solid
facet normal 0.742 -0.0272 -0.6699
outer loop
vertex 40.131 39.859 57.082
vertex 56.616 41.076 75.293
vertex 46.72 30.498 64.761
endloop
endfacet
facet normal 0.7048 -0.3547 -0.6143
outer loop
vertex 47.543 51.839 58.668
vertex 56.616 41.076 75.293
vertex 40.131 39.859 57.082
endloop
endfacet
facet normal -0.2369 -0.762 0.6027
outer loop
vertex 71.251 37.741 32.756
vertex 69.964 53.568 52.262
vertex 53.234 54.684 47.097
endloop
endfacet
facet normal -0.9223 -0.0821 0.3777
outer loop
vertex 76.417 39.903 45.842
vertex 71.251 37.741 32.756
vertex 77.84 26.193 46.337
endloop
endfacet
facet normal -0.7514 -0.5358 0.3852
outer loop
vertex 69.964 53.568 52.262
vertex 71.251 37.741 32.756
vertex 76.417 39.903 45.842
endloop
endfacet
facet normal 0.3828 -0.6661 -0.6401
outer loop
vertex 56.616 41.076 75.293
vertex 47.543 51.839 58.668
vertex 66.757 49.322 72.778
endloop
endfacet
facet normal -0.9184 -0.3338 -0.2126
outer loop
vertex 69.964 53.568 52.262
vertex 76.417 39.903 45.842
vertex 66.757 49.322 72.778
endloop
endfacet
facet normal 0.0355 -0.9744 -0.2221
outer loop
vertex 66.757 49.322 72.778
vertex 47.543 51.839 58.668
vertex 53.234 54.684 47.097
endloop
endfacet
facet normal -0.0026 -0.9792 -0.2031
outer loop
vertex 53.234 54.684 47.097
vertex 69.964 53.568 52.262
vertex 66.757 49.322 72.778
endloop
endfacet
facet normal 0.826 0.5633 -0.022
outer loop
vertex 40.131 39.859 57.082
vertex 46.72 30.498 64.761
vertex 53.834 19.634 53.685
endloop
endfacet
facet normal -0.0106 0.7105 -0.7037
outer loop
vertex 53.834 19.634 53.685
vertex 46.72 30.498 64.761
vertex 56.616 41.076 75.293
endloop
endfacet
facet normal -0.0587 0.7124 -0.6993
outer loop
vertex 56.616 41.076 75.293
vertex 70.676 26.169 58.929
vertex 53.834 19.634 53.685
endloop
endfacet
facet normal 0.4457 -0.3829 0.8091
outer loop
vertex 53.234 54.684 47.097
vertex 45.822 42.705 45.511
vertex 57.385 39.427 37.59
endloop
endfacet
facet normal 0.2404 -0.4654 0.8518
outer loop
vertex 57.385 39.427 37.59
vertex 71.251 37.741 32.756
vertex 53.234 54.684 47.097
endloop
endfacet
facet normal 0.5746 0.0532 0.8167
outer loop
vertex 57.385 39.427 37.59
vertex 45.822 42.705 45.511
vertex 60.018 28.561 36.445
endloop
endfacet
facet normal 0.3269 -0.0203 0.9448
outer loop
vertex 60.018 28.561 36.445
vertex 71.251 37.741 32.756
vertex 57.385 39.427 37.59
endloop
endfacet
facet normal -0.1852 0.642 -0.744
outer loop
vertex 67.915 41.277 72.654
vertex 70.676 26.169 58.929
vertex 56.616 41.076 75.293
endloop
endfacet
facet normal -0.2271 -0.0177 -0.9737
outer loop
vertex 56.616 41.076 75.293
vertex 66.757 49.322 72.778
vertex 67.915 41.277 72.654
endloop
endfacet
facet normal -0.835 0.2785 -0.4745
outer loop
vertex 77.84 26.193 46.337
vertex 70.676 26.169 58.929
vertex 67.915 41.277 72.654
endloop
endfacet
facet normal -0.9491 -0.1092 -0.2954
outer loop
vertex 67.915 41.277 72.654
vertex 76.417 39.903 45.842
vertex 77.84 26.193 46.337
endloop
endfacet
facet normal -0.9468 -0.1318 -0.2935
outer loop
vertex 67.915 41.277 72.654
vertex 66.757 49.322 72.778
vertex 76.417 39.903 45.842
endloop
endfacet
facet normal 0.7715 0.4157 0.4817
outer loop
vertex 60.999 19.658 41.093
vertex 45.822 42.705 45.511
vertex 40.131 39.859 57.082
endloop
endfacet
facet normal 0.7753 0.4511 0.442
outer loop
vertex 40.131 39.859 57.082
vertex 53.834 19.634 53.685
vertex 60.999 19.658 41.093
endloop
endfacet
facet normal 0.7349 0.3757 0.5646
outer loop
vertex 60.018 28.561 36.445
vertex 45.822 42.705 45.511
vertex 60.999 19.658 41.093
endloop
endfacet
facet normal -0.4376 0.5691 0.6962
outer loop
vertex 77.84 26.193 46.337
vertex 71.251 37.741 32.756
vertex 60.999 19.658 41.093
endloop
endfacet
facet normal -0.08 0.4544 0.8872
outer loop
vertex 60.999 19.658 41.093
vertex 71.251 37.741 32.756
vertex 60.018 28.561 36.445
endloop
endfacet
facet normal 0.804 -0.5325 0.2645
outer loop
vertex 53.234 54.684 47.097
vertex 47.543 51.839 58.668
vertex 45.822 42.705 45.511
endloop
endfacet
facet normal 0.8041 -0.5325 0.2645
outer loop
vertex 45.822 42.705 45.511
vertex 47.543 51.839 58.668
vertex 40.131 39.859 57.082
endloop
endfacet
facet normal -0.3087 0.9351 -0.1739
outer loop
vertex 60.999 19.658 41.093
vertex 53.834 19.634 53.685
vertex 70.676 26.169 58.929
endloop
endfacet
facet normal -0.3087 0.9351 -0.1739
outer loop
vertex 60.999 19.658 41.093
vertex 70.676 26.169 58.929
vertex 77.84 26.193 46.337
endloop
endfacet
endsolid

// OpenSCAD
// Auto-generated auxetic polyhedron
points = [
    [46.720492, 30.498426, 64.760858],
    [56.616282, 41.076458, 75.292608],
    [40.131450, 39.859398, 57.081696],
    [47.543452, 51.838998, 58.667975],
    [53.234011, 54.684341, 47.097148],
    [69.963676, 53.568438, 52.262196],
    [71.251190, 37.740931, 32.756251],
    [77.840336, 26.193049, 46.336930],
    [76.417421, 39.903076, 45.842375],
    [66.756905, 49.321526, 72.778494],
    [53.833966, 19.633742, 53.684586],
    [70.675551, 26.168834, 58.928641],
    [57.385443, 39.426693, 37.589793],
    [45.822009, 42.704741, 45.510869],
    [60.018013, 28.561342, 36.444673],
    [67.915249, 41.277303, 72.654258],
    [60.998751, 19.657957, 41.092874],
];

faces = [
    [0, 1, 2],
    [2, 1, 3],
    [4, 5, 6],
    [7, 6, 8],
    [8, 6, 5],
    [9, 3, 1],
    [9, 8, 5],
    [4, 3, 9],
    [9, 5, 4],
    [10, 0, 2],
    [1, 0, 10],
    [10, 11, 1],
    [12, 13, 4],
    [4, 6, 12],
    [14, 13, 12],
    [12, 6, 14],
    [1, 11, 15],
    [15, 9, 1],
    [15, 11, 7],
    [7, 8, 15],
    [8, 9, 15],
    [2, 13, 16],
    [16, 10, 2],
    [16, 13, 14],
    [16, 6, 7],
    [14, 6, 16],
    [13, 3, 4],
    [2, 3, 13],
    [11, 10, 16],
    [7, 11, 16],
];

polyhedron(points = points, faces = faces);
